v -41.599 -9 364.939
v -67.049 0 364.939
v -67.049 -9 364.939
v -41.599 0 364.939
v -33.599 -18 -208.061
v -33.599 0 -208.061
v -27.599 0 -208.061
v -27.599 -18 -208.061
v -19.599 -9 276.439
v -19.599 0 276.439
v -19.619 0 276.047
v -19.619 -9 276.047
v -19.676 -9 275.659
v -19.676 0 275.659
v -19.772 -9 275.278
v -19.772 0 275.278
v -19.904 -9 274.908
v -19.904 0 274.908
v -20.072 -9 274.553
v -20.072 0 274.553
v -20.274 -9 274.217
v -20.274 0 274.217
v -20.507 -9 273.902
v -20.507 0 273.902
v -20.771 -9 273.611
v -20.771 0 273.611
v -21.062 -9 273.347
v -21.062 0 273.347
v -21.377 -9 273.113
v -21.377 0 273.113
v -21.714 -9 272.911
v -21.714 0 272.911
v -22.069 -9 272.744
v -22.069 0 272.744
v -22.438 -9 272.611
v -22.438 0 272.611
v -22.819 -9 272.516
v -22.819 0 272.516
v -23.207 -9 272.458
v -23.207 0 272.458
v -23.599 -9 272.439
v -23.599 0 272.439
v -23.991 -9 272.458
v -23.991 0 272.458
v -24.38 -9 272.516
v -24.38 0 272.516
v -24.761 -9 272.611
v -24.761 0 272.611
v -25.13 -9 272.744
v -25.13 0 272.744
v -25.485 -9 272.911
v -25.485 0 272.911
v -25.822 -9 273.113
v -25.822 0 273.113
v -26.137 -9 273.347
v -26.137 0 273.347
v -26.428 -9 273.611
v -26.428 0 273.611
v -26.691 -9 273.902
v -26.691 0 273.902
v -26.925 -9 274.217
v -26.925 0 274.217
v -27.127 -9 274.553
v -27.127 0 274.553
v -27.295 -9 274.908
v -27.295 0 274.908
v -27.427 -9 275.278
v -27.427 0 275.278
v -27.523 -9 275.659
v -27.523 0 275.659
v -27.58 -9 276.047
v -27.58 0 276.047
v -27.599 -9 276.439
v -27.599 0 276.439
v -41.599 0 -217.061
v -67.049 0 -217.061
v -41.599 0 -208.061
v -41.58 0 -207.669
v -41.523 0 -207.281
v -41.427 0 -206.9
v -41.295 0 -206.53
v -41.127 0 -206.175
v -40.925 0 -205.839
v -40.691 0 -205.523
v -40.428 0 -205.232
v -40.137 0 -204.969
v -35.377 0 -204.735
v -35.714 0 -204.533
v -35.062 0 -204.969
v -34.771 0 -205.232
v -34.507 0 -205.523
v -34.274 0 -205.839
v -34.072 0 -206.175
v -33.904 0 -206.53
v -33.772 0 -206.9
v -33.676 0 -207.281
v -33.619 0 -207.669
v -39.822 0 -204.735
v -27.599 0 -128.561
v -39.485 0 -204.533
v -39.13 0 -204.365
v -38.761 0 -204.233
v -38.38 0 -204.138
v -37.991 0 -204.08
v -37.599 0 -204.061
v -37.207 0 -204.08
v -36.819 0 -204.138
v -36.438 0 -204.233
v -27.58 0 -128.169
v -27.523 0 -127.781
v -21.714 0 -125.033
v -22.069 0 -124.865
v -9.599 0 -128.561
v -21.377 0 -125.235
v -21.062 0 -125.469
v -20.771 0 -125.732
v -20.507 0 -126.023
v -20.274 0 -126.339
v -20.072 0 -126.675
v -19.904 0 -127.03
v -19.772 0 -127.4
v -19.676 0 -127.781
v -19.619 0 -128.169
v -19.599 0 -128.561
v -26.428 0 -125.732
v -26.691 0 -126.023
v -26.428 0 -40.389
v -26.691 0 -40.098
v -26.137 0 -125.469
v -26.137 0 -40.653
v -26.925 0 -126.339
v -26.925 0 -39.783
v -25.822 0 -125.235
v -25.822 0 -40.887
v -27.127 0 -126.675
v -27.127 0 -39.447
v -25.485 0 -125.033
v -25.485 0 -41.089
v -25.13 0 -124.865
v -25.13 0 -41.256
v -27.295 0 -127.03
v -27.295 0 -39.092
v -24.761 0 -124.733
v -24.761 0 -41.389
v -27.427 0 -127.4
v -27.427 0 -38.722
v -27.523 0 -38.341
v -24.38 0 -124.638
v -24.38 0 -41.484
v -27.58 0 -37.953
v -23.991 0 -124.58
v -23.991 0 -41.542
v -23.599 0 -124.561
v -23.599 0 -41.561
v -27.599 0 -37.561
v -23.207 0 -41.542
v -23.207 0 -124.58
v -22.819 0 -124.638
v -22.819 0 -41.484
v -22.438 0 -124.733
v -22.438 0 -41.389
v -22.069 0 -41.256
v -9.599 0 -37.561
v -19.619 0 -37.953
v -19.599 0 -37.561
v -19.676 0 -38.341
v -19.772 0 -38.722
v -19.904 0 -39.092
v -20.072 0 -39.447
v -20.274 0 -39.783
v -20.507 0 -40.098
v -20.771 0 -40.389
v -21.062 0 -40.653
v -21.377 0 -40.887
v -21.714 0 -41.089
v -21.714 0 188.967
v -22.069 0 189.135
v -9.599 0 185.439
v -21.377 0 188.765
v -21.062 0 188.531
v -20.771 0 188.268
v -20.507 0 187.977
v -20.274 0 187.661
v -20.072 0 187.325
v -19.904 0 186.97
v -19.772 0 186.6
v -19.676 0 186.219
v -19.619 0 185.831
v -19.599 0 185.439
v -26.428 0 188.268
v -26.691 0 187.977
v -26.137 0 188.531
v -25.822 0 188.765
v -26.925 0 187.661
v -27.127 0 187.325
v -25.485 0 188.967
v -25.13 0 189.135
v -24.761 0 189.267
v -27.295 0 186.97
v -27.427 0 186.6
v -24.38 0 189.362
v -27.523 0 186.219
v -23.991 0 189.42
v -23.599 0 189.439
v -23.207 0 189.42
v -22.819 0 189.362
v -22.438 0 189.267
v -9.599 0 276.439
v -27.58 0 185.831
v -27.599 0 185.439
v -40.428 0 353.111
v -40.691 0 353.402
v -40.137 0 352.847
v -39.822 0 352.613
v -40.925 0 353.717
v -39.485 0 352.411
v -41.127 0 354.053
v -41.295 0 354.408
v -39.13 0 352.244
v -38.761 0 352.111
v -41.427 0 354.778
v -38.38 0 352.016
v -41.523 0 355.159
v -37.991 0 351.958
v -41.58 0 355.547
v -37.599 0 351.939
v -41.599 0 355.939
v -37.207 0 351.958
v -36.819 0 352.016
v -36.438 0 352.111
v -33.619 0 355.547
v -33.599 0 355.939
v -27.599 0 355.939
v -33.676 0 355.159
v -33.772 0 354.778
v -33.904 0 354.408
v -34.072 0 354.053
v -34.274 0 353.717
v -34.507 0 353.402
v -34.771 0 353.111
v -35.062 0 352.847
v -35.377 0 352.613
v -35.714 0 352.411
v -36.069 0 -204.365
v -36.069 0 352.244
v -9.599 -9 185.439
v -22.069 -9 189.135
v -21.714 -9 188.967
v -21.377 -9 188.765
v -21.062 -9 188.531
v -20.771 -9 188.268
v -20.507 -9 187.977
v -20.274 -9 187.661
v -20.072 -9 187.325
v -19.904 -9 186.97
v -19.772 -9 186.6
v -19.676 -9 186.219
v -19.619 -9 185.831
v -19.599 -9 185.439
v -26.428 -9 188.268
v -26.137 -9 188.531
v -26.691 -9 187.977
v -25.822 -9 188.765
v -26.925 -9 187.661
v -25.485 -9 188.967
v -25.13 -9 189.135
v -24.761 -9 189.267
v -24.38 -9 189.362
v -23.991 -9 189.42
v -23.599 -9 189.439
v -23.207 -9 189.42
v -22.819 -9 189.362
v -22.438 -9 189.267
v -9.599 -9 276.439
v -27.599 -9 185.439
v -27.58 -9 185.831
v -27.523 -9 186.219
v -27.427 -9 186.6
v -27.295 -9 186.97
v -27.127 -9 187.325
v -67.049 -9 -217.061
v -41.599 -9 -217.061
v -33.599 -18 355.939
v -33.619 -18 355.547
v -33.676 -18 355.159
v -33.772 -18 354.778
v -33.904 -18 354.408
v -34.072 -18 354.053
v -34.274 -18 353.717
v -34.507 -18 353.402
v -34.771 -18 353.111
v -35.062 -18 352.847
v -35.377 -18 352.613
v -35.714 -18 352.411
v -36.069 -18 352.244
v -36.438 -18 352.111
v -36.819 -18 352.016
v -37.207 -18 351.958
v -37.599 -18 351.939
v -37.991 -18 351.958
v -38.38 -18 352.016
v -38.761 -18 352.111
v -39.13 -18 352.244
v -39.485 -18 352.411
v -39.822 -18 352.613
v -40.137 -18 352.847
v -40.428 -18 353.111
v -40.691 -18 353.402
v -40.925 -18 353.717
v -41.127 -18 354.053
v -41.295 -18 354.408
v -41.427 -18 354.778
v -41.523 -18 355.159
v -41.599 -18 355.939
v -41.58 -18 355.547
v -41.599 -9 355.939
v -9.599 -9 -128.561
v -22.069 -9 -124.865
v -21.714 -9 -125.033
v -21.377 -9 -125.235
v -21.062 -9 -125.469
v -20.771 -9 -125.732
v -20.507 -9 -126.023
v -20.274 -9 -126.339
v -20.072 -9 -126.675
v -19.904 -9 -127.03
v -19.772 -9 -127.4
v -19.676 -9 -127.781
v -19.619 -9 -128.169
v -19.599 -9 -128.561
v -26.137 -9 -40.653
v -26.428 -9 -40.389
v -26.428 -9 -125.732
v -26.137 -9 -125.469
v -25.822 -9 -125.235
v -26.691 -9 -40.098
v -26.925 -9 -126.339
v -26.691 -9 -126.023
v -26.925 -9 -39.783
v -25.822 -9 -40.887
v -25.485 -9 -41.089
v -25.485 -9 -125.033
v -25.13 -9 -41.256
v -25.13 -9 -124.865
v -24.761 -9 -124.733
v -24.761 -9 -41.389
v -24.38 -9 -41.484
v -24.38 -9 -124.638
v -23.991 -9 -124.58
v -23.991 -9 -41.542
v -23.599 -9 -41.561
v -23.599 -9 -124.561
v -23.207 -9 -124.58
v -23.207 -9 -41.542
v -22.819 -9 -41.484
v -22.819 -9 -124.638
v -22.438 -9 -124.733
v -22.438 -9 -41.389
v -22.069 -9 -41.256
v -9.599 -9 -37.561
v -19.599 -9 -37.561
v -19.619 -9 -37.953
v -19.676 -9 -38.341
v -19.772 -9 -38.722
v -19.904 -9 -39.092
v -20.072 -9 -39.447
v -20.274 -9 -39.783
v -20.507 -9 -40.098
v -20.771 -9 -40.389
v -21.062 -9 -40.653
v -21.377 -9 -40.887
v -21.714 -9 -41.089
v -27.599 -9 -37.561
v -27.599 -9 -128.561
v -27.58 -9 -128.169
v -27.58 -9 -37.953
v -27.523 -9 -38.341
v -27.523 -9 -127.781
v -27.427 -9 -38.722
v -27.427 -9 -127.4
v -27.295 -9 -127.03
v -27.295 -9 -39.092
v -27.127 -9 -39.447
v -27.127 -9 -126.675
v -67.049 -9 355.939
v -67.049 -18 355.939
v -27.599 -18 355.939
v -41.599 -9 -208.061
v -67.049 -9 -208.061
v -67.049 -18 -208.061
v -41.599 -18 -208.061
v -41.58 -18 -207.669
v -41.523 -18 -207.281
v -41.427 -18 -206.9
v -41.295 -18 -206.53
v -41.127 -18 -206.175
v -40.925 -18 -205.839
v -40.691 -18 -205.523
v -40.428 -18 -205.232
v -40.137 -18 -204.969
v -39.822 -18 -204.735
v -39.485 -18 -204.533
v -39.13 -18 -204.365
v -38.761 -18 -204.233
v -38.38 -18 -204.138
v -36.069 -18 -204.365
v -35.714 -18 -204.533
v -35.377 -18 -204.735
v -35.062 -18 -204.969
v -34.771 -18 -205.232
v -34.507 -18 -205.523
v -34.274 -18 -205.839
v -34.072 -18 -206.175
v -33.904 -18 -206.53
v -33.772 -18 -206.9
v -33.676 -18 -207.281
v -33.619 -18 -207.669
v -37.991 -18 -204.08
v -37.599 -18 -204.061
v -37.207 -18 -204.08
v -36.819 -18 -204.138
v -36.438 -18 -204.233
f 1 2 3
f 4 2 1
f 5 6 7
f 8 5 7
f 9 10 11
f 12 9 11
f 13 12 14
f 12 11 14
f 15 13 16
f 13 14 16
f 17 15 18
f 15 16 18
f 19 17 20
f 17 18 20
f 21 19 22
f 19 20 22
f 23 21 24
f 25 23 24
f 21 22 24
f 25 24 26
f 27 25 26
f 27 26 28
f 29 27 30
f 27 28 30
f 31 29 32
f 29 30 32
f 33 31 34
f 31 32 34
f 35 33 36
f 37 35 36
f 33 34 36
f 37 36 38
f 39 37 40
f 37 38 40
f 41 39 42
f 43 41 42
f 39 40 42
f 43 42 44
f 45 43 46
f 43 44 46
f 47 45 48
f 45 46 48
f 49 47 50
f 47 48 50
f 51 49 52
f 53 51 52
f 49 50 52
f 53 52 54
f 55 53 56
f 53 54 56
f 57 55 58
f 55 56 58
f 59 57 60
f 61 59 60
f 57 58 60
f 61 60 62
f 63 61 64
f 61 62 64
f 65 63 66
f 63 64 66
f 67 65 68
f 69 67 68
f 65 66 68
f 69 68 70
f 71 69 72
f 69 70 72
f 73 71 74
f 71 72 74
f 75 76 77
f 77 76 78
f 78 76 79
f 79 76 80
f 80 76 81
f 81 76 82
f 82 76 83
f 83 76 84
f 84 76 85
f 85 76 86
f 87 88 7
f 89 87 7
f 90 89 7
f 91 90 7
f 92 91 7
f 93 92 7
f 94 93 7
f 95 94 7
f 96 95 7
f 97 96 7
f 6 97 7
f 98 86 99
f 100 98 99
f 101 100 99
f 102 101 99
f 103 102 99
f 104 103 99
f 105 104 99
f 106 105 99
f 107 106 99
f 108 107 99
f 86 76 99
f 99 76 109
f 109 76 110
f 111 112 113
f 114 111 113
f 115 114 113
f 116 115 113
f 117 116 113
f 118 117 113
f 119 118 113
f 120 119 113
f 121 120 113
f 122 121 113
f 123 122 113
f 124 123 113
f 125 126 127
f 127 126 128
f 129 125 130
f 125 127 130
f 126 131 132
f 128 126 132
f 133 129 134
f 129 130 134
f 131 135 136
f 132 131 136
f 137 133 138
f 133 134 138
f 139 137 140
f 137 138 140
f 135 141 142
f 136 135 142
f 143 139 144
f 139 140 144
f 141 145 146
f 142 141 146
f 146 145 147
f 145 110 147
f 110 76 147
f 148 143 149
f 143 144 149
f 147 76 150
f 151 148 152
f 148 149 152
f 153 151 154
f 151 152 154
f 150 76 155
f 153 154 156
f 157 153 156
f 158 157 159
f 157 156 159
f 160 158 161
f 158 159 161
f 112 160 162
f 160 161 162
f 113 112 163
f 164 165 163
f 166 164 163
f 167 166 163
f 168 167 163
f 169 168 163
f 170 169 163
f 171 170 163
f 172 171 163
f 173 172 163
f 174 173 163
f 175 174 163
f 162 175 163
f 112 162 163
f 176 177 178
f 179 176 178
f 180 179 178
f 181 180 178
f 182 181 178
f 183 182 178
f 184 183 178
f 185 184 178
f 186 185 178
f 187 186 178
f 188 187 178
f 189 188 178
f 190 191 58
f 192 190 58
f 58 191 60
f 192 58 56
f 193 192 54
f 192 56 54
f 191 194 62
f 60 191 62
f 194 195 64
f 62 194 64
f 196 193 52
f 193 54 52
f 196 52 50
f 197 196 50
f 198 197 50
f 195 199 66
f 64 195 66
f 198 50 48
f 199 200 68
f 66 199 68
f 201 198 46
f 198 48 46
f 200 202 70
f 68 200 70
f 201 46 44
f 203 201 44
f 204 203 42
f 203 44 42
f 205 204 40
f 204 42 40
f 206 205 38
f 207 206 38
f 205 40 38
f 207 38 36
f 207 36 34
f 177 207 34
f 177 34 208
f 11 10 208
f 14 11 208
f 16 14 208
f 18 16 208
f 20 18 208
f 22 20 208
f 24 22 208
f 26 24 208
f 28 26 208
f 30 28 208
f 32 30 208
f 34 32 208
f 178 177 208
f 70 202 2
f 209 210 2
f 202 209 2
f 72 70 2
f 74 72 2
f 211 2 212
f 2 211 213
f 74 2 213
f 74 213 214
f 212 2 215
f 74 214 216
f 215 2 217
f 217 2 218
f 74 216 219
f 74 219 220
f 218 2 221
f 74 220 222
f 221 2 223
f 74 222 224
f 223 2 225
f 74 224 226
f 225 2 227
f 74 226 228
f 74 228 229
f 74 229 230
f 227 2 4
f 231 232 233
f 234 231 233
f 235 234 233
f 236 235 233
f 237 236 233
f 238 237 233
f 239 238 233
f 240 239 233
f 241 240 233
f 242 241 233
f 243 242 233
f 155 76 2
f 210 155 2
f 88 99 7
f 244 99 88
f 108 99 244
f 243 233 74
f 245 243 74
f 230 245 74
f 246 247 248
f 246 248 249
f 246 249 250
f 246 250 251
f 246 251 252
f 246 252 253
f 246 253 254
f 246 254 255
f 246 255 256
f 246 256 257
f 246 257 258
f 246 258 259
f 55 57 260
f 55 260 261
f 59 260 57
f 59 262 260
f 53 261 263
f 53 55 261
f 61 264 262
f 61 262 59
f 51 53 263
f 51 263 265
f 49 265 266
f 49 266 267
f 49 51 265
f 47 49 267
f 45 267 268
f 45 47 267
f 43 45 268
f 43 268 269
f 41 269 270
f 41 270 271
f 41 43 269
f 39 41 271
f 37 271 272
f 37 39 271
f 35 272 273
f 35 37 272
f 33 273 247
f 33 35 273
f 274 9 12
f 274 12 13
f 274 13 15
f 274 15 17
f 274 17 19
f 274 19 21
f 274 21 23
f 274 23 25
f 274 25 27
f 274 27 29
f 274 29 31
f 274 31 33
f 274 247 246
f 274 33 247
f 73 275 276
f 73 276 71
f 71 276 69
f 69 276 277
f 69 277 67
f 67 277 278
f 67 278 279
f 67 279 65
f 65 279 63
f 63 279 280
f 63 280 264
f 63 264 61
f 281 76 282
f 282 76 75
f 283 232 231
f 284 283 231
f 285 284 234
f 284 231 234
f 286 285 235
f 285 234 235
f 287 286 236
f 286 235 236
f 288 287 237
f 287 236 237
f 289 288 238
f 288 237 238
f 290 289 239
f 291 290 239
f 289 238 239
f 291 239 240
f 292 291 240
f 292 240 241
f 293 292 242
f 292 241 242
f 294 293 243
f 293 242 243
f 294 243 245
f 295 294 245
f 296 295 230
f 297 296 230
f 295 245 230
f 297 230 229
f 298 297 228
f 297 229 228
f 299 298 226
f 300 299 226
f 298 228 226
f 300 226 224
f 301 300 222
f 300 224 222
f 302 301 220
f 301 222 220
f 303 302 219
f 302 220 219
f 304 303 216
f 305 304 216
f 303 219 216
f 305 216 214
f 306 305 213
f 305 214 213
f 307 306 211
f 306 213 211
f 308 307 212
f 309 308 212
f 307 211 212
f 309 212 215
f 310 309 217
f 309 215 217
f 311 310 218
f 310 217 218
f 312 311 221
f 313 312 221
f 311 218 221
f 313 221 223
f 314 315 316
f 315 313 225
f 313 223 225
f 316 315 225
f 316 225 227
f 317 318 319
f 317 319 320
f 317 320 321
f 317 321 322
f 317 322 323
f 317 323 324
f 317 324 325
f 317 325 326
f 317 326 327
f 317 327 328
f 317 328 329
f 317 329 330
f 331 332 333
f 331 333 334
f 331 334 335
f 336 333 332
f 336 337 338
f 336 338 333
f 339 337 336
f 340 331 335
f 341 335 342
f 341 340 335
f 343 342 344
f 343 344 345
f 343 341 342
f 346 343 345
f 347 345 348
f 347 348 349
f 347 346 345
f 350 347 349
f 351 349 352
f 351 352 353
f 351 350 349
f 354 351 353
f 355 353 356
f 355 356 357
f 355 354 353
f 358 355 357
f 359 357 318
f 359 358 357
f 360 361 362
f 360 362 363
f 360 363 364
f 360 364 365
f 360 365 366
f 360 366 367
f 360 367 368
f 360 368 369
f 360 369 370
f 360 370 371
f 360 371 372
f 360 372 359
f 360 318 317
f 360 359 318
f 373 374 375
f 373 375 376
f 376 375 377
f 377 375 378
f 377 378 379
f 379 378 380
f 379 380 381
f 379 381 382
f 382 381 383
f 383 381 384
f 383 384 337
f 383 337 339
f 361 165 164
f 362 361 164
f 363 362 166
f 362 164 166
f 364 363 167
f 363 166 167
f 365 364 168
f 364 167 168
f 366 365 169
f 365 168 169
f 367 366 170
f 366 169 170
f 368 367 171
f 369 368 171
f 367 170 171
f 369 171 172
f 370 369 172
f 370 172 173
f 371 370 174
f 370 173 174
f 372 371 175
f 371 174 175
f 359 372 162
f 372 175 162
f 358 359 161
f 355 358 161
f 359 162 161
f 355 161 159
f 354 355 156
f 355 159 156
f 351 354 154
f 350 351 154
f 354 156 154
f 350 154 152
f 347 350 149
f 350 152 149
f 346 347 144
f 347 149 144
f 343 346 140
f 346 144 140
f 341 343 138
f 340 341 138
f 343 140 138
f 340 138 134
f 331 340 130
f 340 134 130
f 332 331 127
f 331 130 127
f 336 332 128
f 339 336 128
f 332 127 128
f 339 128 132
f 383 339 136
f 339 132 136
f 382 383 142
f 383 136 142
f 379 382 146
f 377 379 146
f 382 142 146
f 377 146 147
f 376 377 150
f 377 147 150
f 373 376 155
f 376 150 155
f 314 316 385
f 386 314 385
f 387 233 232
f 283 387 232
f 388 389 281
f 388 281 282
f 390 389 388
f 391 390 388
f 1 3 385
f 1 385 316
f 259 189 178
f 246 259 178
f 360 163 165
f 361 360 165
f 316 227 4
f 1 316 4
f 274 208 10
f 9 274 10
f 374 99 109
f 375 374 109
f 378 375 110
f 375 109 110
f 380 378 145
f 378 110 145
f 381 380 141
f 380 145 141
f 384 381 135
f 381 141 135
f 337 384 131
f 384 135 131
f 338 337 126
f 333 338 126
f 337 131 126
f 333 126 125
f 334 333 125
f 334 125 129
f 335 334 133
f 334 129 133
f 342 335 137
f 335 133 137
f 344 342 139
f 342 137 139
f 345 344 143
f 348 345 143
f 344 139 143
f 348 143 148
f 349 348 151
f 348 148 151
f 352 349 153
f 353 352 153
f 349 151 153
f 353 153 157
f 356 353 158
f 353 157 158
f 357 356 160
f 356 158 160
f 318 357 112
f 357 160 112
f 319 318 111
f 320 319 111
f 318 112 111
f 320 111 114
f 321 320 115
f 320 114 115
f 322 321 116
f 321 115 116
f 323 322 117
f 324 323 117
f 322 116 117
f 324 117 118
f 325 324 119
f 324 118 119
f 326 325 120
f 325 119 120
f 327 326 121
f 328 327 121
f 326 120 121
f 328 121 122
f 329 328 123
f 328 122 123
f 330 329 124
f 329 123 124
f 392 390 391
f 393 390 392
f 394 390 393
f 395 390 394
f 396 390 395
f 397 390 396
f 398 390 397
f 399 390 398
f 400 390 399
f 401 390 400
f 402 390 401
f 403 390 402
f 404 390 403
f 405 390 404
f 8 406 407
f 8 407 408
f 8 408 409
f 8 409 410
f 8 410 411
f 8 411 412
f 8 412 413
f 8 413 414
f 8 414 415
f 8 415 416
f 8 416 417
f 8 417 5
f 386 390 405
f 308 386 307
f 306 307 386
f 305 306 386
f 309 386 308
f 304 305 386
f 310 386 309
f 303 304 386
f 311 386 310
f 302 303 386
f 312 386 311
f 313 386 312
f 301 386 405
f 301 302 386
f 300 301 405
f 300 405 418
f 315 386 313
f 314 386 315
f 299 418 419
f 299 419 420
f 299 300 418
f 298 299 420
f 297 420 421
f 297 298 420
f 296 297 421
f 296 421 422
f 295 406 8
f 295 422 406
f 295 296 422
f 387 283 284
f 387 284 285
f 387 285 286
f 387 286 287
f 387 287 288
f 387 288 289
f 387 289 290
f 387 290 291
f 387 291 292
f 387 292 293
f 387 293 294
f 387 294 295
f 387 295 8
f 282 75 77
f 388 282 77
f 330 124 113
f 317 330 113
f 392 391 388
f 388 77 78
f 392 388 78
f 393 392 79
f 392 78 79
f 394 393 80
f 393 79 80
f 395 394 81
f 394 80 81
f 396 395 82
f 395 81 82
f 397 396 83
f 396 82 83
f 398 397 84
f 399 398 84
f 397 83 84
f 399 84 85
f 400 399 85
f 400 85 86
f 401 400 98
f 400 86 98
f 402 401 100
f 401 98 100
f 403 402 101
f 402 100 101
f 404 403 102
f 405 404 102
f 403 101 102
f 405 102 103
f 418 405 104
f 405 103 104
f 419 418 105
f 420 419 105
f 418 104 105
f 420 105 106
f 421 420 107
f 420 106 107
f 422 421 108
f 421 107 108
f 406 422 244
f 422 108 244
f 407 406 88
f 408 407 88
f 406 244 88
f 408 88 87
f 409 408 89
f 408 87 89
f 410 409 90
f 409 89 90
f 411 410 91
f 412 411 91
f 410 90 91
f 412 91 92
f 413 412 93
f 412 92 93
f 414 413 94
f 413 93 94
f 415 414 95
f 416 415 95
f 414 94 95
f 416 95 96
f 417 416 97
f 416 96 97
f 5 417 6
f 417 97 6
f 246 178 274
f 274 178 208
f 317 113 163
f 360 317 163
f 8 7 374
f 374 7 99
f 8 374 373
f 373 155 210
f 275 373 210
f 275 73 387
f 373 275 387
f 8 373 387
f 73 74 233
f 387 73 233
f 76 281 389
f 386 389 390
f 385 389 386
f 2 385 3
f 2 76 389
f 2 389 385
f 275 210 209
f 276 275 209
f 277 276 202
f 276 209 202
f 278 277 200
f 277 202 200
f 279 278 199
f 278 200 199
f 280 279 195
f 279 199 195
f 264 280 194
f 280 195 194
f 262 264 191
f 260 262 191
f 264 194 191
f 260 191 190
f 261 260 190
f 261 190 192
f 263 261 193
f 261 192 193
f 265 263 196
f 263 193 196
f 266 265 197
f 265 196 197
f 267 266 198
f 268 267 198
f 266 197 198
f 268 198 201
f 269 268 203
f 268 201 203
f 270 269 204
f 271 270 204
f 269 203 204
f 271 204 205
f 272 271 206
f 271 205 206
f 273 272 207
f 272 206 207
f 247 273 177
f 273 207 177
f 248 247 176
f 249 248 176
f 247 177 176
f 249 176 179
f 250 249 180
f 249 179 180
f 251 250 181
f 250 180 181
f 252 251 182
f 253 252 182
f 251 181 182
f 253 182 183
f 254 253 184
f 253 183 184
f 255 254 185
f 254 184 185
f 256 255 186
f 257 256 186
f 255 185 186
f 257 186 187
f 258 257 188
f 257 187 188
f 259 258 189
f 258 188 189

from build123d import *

# Parameters (mm, degrees)
F1_DEPTH = 18
F0_W     = 25.45
F0_H     = 9
F2_DEPTH = 9


with BuildPart() as f1:
    # F0 (on Front) → F1 (new body)
    with BuildSketch(Plane.XZ):
        with BuildLine():
            Line((-27.599424, 185.439078), (-27.599424, 276.439078))
            Line((-27.599424, 276.439078), (-27.599424, 278.939078))
            Line((-27.599424, 278.939078), (-27.599424, 355.939078))
            Line((-27.599424, 355.939078), (-33.599424, 355.939078))
            ThreePointArc((-33.599424, 355.939078), (-37.599424, 351.939078), (-41.599424, 355.939078))
            Line((-41.599424, 355.939078), (-67.049424, 355.939078))
            Line((-67.049424, 355.939078), (-67.049424, -208.060922))
            Line((-67.049424, -208.060922), (-41.599424, -208.060922))
            ThreePointArc((-41.599424, -208.060922), (-37.599424, -204.060922), (-33.599424, -208.060922))
            Line((-33.599424, -208.060922), (-27.599424, -208.060922))
            Line((-27.599424, -208.060922), (-27.599424, -131.060922))
            Line((-27.599424, -131.060922), (-27.599424, -128.560922))
            Line((-27.599424, -128.560922), (-27.599424, -37.560922))
            Line((-27.599424, -37.560922), (-27.599424, -35.060922))
            Line((-27.599424, -35.060922), (-27.599424, 182.939078))
            Line((-27.599424, 182.939078), (-27.599424, 185.439078))
        make_face()
    extrude(amount=F1_DEPTH)

    # F0 (on Front) → F2 (join)
    with BuildSketch(Plane.XZ):
        with Locations((-54.324424, 360.439078)):
            Rectangle(F0_W, F0_H)
        with BuildLine():
            ThreePointArc((-19.599424, 276.439078), (-23.599424, 272.439078), (-27.599424, 276.439078))
            Line((-27.599424, 276.439078), (-27.599424, 185.439078))
            ThreePointArc((-27.599424, 185.439078), (-23.599424, 189.439078), (-19.599424, 185.439078))
            Line((-19.599424, 185.439078), (-9.599424, 185.439078))
            Line((-9.599424, 185.439078), (-9.599424, 276.439078))
            Line((-9.599424, 276.439078), (-19.599424, 276.439078))
        make_face()
        with BuildLine():
            ThreePointArc((-19.599424, -37.560922), (-23.599424, -41.560922), (-27.599424, -37.560922))
            Line((-27.599424, -37.560922), (-27.599424, -128.560922))
            ThreePointArc((-27.599424, -128.560922), (-23.599424, -124.560922), (-19.599424, -128.560922))
            Line((-19.599424, -128.560922), (-9.599424, -128.560922))
            Line((-9.599424, -128.560922), (-9.599424, -37.560922))
            Line((-9.599424, -37.560922), (-19.599424, -37.560922))
        make_face()
        with Locations((-54.324424, -212.560922)):
            Rectangle(F0_W, F0_H)
    extrude(amount=F2_DEPTH)


solid = f1.part
